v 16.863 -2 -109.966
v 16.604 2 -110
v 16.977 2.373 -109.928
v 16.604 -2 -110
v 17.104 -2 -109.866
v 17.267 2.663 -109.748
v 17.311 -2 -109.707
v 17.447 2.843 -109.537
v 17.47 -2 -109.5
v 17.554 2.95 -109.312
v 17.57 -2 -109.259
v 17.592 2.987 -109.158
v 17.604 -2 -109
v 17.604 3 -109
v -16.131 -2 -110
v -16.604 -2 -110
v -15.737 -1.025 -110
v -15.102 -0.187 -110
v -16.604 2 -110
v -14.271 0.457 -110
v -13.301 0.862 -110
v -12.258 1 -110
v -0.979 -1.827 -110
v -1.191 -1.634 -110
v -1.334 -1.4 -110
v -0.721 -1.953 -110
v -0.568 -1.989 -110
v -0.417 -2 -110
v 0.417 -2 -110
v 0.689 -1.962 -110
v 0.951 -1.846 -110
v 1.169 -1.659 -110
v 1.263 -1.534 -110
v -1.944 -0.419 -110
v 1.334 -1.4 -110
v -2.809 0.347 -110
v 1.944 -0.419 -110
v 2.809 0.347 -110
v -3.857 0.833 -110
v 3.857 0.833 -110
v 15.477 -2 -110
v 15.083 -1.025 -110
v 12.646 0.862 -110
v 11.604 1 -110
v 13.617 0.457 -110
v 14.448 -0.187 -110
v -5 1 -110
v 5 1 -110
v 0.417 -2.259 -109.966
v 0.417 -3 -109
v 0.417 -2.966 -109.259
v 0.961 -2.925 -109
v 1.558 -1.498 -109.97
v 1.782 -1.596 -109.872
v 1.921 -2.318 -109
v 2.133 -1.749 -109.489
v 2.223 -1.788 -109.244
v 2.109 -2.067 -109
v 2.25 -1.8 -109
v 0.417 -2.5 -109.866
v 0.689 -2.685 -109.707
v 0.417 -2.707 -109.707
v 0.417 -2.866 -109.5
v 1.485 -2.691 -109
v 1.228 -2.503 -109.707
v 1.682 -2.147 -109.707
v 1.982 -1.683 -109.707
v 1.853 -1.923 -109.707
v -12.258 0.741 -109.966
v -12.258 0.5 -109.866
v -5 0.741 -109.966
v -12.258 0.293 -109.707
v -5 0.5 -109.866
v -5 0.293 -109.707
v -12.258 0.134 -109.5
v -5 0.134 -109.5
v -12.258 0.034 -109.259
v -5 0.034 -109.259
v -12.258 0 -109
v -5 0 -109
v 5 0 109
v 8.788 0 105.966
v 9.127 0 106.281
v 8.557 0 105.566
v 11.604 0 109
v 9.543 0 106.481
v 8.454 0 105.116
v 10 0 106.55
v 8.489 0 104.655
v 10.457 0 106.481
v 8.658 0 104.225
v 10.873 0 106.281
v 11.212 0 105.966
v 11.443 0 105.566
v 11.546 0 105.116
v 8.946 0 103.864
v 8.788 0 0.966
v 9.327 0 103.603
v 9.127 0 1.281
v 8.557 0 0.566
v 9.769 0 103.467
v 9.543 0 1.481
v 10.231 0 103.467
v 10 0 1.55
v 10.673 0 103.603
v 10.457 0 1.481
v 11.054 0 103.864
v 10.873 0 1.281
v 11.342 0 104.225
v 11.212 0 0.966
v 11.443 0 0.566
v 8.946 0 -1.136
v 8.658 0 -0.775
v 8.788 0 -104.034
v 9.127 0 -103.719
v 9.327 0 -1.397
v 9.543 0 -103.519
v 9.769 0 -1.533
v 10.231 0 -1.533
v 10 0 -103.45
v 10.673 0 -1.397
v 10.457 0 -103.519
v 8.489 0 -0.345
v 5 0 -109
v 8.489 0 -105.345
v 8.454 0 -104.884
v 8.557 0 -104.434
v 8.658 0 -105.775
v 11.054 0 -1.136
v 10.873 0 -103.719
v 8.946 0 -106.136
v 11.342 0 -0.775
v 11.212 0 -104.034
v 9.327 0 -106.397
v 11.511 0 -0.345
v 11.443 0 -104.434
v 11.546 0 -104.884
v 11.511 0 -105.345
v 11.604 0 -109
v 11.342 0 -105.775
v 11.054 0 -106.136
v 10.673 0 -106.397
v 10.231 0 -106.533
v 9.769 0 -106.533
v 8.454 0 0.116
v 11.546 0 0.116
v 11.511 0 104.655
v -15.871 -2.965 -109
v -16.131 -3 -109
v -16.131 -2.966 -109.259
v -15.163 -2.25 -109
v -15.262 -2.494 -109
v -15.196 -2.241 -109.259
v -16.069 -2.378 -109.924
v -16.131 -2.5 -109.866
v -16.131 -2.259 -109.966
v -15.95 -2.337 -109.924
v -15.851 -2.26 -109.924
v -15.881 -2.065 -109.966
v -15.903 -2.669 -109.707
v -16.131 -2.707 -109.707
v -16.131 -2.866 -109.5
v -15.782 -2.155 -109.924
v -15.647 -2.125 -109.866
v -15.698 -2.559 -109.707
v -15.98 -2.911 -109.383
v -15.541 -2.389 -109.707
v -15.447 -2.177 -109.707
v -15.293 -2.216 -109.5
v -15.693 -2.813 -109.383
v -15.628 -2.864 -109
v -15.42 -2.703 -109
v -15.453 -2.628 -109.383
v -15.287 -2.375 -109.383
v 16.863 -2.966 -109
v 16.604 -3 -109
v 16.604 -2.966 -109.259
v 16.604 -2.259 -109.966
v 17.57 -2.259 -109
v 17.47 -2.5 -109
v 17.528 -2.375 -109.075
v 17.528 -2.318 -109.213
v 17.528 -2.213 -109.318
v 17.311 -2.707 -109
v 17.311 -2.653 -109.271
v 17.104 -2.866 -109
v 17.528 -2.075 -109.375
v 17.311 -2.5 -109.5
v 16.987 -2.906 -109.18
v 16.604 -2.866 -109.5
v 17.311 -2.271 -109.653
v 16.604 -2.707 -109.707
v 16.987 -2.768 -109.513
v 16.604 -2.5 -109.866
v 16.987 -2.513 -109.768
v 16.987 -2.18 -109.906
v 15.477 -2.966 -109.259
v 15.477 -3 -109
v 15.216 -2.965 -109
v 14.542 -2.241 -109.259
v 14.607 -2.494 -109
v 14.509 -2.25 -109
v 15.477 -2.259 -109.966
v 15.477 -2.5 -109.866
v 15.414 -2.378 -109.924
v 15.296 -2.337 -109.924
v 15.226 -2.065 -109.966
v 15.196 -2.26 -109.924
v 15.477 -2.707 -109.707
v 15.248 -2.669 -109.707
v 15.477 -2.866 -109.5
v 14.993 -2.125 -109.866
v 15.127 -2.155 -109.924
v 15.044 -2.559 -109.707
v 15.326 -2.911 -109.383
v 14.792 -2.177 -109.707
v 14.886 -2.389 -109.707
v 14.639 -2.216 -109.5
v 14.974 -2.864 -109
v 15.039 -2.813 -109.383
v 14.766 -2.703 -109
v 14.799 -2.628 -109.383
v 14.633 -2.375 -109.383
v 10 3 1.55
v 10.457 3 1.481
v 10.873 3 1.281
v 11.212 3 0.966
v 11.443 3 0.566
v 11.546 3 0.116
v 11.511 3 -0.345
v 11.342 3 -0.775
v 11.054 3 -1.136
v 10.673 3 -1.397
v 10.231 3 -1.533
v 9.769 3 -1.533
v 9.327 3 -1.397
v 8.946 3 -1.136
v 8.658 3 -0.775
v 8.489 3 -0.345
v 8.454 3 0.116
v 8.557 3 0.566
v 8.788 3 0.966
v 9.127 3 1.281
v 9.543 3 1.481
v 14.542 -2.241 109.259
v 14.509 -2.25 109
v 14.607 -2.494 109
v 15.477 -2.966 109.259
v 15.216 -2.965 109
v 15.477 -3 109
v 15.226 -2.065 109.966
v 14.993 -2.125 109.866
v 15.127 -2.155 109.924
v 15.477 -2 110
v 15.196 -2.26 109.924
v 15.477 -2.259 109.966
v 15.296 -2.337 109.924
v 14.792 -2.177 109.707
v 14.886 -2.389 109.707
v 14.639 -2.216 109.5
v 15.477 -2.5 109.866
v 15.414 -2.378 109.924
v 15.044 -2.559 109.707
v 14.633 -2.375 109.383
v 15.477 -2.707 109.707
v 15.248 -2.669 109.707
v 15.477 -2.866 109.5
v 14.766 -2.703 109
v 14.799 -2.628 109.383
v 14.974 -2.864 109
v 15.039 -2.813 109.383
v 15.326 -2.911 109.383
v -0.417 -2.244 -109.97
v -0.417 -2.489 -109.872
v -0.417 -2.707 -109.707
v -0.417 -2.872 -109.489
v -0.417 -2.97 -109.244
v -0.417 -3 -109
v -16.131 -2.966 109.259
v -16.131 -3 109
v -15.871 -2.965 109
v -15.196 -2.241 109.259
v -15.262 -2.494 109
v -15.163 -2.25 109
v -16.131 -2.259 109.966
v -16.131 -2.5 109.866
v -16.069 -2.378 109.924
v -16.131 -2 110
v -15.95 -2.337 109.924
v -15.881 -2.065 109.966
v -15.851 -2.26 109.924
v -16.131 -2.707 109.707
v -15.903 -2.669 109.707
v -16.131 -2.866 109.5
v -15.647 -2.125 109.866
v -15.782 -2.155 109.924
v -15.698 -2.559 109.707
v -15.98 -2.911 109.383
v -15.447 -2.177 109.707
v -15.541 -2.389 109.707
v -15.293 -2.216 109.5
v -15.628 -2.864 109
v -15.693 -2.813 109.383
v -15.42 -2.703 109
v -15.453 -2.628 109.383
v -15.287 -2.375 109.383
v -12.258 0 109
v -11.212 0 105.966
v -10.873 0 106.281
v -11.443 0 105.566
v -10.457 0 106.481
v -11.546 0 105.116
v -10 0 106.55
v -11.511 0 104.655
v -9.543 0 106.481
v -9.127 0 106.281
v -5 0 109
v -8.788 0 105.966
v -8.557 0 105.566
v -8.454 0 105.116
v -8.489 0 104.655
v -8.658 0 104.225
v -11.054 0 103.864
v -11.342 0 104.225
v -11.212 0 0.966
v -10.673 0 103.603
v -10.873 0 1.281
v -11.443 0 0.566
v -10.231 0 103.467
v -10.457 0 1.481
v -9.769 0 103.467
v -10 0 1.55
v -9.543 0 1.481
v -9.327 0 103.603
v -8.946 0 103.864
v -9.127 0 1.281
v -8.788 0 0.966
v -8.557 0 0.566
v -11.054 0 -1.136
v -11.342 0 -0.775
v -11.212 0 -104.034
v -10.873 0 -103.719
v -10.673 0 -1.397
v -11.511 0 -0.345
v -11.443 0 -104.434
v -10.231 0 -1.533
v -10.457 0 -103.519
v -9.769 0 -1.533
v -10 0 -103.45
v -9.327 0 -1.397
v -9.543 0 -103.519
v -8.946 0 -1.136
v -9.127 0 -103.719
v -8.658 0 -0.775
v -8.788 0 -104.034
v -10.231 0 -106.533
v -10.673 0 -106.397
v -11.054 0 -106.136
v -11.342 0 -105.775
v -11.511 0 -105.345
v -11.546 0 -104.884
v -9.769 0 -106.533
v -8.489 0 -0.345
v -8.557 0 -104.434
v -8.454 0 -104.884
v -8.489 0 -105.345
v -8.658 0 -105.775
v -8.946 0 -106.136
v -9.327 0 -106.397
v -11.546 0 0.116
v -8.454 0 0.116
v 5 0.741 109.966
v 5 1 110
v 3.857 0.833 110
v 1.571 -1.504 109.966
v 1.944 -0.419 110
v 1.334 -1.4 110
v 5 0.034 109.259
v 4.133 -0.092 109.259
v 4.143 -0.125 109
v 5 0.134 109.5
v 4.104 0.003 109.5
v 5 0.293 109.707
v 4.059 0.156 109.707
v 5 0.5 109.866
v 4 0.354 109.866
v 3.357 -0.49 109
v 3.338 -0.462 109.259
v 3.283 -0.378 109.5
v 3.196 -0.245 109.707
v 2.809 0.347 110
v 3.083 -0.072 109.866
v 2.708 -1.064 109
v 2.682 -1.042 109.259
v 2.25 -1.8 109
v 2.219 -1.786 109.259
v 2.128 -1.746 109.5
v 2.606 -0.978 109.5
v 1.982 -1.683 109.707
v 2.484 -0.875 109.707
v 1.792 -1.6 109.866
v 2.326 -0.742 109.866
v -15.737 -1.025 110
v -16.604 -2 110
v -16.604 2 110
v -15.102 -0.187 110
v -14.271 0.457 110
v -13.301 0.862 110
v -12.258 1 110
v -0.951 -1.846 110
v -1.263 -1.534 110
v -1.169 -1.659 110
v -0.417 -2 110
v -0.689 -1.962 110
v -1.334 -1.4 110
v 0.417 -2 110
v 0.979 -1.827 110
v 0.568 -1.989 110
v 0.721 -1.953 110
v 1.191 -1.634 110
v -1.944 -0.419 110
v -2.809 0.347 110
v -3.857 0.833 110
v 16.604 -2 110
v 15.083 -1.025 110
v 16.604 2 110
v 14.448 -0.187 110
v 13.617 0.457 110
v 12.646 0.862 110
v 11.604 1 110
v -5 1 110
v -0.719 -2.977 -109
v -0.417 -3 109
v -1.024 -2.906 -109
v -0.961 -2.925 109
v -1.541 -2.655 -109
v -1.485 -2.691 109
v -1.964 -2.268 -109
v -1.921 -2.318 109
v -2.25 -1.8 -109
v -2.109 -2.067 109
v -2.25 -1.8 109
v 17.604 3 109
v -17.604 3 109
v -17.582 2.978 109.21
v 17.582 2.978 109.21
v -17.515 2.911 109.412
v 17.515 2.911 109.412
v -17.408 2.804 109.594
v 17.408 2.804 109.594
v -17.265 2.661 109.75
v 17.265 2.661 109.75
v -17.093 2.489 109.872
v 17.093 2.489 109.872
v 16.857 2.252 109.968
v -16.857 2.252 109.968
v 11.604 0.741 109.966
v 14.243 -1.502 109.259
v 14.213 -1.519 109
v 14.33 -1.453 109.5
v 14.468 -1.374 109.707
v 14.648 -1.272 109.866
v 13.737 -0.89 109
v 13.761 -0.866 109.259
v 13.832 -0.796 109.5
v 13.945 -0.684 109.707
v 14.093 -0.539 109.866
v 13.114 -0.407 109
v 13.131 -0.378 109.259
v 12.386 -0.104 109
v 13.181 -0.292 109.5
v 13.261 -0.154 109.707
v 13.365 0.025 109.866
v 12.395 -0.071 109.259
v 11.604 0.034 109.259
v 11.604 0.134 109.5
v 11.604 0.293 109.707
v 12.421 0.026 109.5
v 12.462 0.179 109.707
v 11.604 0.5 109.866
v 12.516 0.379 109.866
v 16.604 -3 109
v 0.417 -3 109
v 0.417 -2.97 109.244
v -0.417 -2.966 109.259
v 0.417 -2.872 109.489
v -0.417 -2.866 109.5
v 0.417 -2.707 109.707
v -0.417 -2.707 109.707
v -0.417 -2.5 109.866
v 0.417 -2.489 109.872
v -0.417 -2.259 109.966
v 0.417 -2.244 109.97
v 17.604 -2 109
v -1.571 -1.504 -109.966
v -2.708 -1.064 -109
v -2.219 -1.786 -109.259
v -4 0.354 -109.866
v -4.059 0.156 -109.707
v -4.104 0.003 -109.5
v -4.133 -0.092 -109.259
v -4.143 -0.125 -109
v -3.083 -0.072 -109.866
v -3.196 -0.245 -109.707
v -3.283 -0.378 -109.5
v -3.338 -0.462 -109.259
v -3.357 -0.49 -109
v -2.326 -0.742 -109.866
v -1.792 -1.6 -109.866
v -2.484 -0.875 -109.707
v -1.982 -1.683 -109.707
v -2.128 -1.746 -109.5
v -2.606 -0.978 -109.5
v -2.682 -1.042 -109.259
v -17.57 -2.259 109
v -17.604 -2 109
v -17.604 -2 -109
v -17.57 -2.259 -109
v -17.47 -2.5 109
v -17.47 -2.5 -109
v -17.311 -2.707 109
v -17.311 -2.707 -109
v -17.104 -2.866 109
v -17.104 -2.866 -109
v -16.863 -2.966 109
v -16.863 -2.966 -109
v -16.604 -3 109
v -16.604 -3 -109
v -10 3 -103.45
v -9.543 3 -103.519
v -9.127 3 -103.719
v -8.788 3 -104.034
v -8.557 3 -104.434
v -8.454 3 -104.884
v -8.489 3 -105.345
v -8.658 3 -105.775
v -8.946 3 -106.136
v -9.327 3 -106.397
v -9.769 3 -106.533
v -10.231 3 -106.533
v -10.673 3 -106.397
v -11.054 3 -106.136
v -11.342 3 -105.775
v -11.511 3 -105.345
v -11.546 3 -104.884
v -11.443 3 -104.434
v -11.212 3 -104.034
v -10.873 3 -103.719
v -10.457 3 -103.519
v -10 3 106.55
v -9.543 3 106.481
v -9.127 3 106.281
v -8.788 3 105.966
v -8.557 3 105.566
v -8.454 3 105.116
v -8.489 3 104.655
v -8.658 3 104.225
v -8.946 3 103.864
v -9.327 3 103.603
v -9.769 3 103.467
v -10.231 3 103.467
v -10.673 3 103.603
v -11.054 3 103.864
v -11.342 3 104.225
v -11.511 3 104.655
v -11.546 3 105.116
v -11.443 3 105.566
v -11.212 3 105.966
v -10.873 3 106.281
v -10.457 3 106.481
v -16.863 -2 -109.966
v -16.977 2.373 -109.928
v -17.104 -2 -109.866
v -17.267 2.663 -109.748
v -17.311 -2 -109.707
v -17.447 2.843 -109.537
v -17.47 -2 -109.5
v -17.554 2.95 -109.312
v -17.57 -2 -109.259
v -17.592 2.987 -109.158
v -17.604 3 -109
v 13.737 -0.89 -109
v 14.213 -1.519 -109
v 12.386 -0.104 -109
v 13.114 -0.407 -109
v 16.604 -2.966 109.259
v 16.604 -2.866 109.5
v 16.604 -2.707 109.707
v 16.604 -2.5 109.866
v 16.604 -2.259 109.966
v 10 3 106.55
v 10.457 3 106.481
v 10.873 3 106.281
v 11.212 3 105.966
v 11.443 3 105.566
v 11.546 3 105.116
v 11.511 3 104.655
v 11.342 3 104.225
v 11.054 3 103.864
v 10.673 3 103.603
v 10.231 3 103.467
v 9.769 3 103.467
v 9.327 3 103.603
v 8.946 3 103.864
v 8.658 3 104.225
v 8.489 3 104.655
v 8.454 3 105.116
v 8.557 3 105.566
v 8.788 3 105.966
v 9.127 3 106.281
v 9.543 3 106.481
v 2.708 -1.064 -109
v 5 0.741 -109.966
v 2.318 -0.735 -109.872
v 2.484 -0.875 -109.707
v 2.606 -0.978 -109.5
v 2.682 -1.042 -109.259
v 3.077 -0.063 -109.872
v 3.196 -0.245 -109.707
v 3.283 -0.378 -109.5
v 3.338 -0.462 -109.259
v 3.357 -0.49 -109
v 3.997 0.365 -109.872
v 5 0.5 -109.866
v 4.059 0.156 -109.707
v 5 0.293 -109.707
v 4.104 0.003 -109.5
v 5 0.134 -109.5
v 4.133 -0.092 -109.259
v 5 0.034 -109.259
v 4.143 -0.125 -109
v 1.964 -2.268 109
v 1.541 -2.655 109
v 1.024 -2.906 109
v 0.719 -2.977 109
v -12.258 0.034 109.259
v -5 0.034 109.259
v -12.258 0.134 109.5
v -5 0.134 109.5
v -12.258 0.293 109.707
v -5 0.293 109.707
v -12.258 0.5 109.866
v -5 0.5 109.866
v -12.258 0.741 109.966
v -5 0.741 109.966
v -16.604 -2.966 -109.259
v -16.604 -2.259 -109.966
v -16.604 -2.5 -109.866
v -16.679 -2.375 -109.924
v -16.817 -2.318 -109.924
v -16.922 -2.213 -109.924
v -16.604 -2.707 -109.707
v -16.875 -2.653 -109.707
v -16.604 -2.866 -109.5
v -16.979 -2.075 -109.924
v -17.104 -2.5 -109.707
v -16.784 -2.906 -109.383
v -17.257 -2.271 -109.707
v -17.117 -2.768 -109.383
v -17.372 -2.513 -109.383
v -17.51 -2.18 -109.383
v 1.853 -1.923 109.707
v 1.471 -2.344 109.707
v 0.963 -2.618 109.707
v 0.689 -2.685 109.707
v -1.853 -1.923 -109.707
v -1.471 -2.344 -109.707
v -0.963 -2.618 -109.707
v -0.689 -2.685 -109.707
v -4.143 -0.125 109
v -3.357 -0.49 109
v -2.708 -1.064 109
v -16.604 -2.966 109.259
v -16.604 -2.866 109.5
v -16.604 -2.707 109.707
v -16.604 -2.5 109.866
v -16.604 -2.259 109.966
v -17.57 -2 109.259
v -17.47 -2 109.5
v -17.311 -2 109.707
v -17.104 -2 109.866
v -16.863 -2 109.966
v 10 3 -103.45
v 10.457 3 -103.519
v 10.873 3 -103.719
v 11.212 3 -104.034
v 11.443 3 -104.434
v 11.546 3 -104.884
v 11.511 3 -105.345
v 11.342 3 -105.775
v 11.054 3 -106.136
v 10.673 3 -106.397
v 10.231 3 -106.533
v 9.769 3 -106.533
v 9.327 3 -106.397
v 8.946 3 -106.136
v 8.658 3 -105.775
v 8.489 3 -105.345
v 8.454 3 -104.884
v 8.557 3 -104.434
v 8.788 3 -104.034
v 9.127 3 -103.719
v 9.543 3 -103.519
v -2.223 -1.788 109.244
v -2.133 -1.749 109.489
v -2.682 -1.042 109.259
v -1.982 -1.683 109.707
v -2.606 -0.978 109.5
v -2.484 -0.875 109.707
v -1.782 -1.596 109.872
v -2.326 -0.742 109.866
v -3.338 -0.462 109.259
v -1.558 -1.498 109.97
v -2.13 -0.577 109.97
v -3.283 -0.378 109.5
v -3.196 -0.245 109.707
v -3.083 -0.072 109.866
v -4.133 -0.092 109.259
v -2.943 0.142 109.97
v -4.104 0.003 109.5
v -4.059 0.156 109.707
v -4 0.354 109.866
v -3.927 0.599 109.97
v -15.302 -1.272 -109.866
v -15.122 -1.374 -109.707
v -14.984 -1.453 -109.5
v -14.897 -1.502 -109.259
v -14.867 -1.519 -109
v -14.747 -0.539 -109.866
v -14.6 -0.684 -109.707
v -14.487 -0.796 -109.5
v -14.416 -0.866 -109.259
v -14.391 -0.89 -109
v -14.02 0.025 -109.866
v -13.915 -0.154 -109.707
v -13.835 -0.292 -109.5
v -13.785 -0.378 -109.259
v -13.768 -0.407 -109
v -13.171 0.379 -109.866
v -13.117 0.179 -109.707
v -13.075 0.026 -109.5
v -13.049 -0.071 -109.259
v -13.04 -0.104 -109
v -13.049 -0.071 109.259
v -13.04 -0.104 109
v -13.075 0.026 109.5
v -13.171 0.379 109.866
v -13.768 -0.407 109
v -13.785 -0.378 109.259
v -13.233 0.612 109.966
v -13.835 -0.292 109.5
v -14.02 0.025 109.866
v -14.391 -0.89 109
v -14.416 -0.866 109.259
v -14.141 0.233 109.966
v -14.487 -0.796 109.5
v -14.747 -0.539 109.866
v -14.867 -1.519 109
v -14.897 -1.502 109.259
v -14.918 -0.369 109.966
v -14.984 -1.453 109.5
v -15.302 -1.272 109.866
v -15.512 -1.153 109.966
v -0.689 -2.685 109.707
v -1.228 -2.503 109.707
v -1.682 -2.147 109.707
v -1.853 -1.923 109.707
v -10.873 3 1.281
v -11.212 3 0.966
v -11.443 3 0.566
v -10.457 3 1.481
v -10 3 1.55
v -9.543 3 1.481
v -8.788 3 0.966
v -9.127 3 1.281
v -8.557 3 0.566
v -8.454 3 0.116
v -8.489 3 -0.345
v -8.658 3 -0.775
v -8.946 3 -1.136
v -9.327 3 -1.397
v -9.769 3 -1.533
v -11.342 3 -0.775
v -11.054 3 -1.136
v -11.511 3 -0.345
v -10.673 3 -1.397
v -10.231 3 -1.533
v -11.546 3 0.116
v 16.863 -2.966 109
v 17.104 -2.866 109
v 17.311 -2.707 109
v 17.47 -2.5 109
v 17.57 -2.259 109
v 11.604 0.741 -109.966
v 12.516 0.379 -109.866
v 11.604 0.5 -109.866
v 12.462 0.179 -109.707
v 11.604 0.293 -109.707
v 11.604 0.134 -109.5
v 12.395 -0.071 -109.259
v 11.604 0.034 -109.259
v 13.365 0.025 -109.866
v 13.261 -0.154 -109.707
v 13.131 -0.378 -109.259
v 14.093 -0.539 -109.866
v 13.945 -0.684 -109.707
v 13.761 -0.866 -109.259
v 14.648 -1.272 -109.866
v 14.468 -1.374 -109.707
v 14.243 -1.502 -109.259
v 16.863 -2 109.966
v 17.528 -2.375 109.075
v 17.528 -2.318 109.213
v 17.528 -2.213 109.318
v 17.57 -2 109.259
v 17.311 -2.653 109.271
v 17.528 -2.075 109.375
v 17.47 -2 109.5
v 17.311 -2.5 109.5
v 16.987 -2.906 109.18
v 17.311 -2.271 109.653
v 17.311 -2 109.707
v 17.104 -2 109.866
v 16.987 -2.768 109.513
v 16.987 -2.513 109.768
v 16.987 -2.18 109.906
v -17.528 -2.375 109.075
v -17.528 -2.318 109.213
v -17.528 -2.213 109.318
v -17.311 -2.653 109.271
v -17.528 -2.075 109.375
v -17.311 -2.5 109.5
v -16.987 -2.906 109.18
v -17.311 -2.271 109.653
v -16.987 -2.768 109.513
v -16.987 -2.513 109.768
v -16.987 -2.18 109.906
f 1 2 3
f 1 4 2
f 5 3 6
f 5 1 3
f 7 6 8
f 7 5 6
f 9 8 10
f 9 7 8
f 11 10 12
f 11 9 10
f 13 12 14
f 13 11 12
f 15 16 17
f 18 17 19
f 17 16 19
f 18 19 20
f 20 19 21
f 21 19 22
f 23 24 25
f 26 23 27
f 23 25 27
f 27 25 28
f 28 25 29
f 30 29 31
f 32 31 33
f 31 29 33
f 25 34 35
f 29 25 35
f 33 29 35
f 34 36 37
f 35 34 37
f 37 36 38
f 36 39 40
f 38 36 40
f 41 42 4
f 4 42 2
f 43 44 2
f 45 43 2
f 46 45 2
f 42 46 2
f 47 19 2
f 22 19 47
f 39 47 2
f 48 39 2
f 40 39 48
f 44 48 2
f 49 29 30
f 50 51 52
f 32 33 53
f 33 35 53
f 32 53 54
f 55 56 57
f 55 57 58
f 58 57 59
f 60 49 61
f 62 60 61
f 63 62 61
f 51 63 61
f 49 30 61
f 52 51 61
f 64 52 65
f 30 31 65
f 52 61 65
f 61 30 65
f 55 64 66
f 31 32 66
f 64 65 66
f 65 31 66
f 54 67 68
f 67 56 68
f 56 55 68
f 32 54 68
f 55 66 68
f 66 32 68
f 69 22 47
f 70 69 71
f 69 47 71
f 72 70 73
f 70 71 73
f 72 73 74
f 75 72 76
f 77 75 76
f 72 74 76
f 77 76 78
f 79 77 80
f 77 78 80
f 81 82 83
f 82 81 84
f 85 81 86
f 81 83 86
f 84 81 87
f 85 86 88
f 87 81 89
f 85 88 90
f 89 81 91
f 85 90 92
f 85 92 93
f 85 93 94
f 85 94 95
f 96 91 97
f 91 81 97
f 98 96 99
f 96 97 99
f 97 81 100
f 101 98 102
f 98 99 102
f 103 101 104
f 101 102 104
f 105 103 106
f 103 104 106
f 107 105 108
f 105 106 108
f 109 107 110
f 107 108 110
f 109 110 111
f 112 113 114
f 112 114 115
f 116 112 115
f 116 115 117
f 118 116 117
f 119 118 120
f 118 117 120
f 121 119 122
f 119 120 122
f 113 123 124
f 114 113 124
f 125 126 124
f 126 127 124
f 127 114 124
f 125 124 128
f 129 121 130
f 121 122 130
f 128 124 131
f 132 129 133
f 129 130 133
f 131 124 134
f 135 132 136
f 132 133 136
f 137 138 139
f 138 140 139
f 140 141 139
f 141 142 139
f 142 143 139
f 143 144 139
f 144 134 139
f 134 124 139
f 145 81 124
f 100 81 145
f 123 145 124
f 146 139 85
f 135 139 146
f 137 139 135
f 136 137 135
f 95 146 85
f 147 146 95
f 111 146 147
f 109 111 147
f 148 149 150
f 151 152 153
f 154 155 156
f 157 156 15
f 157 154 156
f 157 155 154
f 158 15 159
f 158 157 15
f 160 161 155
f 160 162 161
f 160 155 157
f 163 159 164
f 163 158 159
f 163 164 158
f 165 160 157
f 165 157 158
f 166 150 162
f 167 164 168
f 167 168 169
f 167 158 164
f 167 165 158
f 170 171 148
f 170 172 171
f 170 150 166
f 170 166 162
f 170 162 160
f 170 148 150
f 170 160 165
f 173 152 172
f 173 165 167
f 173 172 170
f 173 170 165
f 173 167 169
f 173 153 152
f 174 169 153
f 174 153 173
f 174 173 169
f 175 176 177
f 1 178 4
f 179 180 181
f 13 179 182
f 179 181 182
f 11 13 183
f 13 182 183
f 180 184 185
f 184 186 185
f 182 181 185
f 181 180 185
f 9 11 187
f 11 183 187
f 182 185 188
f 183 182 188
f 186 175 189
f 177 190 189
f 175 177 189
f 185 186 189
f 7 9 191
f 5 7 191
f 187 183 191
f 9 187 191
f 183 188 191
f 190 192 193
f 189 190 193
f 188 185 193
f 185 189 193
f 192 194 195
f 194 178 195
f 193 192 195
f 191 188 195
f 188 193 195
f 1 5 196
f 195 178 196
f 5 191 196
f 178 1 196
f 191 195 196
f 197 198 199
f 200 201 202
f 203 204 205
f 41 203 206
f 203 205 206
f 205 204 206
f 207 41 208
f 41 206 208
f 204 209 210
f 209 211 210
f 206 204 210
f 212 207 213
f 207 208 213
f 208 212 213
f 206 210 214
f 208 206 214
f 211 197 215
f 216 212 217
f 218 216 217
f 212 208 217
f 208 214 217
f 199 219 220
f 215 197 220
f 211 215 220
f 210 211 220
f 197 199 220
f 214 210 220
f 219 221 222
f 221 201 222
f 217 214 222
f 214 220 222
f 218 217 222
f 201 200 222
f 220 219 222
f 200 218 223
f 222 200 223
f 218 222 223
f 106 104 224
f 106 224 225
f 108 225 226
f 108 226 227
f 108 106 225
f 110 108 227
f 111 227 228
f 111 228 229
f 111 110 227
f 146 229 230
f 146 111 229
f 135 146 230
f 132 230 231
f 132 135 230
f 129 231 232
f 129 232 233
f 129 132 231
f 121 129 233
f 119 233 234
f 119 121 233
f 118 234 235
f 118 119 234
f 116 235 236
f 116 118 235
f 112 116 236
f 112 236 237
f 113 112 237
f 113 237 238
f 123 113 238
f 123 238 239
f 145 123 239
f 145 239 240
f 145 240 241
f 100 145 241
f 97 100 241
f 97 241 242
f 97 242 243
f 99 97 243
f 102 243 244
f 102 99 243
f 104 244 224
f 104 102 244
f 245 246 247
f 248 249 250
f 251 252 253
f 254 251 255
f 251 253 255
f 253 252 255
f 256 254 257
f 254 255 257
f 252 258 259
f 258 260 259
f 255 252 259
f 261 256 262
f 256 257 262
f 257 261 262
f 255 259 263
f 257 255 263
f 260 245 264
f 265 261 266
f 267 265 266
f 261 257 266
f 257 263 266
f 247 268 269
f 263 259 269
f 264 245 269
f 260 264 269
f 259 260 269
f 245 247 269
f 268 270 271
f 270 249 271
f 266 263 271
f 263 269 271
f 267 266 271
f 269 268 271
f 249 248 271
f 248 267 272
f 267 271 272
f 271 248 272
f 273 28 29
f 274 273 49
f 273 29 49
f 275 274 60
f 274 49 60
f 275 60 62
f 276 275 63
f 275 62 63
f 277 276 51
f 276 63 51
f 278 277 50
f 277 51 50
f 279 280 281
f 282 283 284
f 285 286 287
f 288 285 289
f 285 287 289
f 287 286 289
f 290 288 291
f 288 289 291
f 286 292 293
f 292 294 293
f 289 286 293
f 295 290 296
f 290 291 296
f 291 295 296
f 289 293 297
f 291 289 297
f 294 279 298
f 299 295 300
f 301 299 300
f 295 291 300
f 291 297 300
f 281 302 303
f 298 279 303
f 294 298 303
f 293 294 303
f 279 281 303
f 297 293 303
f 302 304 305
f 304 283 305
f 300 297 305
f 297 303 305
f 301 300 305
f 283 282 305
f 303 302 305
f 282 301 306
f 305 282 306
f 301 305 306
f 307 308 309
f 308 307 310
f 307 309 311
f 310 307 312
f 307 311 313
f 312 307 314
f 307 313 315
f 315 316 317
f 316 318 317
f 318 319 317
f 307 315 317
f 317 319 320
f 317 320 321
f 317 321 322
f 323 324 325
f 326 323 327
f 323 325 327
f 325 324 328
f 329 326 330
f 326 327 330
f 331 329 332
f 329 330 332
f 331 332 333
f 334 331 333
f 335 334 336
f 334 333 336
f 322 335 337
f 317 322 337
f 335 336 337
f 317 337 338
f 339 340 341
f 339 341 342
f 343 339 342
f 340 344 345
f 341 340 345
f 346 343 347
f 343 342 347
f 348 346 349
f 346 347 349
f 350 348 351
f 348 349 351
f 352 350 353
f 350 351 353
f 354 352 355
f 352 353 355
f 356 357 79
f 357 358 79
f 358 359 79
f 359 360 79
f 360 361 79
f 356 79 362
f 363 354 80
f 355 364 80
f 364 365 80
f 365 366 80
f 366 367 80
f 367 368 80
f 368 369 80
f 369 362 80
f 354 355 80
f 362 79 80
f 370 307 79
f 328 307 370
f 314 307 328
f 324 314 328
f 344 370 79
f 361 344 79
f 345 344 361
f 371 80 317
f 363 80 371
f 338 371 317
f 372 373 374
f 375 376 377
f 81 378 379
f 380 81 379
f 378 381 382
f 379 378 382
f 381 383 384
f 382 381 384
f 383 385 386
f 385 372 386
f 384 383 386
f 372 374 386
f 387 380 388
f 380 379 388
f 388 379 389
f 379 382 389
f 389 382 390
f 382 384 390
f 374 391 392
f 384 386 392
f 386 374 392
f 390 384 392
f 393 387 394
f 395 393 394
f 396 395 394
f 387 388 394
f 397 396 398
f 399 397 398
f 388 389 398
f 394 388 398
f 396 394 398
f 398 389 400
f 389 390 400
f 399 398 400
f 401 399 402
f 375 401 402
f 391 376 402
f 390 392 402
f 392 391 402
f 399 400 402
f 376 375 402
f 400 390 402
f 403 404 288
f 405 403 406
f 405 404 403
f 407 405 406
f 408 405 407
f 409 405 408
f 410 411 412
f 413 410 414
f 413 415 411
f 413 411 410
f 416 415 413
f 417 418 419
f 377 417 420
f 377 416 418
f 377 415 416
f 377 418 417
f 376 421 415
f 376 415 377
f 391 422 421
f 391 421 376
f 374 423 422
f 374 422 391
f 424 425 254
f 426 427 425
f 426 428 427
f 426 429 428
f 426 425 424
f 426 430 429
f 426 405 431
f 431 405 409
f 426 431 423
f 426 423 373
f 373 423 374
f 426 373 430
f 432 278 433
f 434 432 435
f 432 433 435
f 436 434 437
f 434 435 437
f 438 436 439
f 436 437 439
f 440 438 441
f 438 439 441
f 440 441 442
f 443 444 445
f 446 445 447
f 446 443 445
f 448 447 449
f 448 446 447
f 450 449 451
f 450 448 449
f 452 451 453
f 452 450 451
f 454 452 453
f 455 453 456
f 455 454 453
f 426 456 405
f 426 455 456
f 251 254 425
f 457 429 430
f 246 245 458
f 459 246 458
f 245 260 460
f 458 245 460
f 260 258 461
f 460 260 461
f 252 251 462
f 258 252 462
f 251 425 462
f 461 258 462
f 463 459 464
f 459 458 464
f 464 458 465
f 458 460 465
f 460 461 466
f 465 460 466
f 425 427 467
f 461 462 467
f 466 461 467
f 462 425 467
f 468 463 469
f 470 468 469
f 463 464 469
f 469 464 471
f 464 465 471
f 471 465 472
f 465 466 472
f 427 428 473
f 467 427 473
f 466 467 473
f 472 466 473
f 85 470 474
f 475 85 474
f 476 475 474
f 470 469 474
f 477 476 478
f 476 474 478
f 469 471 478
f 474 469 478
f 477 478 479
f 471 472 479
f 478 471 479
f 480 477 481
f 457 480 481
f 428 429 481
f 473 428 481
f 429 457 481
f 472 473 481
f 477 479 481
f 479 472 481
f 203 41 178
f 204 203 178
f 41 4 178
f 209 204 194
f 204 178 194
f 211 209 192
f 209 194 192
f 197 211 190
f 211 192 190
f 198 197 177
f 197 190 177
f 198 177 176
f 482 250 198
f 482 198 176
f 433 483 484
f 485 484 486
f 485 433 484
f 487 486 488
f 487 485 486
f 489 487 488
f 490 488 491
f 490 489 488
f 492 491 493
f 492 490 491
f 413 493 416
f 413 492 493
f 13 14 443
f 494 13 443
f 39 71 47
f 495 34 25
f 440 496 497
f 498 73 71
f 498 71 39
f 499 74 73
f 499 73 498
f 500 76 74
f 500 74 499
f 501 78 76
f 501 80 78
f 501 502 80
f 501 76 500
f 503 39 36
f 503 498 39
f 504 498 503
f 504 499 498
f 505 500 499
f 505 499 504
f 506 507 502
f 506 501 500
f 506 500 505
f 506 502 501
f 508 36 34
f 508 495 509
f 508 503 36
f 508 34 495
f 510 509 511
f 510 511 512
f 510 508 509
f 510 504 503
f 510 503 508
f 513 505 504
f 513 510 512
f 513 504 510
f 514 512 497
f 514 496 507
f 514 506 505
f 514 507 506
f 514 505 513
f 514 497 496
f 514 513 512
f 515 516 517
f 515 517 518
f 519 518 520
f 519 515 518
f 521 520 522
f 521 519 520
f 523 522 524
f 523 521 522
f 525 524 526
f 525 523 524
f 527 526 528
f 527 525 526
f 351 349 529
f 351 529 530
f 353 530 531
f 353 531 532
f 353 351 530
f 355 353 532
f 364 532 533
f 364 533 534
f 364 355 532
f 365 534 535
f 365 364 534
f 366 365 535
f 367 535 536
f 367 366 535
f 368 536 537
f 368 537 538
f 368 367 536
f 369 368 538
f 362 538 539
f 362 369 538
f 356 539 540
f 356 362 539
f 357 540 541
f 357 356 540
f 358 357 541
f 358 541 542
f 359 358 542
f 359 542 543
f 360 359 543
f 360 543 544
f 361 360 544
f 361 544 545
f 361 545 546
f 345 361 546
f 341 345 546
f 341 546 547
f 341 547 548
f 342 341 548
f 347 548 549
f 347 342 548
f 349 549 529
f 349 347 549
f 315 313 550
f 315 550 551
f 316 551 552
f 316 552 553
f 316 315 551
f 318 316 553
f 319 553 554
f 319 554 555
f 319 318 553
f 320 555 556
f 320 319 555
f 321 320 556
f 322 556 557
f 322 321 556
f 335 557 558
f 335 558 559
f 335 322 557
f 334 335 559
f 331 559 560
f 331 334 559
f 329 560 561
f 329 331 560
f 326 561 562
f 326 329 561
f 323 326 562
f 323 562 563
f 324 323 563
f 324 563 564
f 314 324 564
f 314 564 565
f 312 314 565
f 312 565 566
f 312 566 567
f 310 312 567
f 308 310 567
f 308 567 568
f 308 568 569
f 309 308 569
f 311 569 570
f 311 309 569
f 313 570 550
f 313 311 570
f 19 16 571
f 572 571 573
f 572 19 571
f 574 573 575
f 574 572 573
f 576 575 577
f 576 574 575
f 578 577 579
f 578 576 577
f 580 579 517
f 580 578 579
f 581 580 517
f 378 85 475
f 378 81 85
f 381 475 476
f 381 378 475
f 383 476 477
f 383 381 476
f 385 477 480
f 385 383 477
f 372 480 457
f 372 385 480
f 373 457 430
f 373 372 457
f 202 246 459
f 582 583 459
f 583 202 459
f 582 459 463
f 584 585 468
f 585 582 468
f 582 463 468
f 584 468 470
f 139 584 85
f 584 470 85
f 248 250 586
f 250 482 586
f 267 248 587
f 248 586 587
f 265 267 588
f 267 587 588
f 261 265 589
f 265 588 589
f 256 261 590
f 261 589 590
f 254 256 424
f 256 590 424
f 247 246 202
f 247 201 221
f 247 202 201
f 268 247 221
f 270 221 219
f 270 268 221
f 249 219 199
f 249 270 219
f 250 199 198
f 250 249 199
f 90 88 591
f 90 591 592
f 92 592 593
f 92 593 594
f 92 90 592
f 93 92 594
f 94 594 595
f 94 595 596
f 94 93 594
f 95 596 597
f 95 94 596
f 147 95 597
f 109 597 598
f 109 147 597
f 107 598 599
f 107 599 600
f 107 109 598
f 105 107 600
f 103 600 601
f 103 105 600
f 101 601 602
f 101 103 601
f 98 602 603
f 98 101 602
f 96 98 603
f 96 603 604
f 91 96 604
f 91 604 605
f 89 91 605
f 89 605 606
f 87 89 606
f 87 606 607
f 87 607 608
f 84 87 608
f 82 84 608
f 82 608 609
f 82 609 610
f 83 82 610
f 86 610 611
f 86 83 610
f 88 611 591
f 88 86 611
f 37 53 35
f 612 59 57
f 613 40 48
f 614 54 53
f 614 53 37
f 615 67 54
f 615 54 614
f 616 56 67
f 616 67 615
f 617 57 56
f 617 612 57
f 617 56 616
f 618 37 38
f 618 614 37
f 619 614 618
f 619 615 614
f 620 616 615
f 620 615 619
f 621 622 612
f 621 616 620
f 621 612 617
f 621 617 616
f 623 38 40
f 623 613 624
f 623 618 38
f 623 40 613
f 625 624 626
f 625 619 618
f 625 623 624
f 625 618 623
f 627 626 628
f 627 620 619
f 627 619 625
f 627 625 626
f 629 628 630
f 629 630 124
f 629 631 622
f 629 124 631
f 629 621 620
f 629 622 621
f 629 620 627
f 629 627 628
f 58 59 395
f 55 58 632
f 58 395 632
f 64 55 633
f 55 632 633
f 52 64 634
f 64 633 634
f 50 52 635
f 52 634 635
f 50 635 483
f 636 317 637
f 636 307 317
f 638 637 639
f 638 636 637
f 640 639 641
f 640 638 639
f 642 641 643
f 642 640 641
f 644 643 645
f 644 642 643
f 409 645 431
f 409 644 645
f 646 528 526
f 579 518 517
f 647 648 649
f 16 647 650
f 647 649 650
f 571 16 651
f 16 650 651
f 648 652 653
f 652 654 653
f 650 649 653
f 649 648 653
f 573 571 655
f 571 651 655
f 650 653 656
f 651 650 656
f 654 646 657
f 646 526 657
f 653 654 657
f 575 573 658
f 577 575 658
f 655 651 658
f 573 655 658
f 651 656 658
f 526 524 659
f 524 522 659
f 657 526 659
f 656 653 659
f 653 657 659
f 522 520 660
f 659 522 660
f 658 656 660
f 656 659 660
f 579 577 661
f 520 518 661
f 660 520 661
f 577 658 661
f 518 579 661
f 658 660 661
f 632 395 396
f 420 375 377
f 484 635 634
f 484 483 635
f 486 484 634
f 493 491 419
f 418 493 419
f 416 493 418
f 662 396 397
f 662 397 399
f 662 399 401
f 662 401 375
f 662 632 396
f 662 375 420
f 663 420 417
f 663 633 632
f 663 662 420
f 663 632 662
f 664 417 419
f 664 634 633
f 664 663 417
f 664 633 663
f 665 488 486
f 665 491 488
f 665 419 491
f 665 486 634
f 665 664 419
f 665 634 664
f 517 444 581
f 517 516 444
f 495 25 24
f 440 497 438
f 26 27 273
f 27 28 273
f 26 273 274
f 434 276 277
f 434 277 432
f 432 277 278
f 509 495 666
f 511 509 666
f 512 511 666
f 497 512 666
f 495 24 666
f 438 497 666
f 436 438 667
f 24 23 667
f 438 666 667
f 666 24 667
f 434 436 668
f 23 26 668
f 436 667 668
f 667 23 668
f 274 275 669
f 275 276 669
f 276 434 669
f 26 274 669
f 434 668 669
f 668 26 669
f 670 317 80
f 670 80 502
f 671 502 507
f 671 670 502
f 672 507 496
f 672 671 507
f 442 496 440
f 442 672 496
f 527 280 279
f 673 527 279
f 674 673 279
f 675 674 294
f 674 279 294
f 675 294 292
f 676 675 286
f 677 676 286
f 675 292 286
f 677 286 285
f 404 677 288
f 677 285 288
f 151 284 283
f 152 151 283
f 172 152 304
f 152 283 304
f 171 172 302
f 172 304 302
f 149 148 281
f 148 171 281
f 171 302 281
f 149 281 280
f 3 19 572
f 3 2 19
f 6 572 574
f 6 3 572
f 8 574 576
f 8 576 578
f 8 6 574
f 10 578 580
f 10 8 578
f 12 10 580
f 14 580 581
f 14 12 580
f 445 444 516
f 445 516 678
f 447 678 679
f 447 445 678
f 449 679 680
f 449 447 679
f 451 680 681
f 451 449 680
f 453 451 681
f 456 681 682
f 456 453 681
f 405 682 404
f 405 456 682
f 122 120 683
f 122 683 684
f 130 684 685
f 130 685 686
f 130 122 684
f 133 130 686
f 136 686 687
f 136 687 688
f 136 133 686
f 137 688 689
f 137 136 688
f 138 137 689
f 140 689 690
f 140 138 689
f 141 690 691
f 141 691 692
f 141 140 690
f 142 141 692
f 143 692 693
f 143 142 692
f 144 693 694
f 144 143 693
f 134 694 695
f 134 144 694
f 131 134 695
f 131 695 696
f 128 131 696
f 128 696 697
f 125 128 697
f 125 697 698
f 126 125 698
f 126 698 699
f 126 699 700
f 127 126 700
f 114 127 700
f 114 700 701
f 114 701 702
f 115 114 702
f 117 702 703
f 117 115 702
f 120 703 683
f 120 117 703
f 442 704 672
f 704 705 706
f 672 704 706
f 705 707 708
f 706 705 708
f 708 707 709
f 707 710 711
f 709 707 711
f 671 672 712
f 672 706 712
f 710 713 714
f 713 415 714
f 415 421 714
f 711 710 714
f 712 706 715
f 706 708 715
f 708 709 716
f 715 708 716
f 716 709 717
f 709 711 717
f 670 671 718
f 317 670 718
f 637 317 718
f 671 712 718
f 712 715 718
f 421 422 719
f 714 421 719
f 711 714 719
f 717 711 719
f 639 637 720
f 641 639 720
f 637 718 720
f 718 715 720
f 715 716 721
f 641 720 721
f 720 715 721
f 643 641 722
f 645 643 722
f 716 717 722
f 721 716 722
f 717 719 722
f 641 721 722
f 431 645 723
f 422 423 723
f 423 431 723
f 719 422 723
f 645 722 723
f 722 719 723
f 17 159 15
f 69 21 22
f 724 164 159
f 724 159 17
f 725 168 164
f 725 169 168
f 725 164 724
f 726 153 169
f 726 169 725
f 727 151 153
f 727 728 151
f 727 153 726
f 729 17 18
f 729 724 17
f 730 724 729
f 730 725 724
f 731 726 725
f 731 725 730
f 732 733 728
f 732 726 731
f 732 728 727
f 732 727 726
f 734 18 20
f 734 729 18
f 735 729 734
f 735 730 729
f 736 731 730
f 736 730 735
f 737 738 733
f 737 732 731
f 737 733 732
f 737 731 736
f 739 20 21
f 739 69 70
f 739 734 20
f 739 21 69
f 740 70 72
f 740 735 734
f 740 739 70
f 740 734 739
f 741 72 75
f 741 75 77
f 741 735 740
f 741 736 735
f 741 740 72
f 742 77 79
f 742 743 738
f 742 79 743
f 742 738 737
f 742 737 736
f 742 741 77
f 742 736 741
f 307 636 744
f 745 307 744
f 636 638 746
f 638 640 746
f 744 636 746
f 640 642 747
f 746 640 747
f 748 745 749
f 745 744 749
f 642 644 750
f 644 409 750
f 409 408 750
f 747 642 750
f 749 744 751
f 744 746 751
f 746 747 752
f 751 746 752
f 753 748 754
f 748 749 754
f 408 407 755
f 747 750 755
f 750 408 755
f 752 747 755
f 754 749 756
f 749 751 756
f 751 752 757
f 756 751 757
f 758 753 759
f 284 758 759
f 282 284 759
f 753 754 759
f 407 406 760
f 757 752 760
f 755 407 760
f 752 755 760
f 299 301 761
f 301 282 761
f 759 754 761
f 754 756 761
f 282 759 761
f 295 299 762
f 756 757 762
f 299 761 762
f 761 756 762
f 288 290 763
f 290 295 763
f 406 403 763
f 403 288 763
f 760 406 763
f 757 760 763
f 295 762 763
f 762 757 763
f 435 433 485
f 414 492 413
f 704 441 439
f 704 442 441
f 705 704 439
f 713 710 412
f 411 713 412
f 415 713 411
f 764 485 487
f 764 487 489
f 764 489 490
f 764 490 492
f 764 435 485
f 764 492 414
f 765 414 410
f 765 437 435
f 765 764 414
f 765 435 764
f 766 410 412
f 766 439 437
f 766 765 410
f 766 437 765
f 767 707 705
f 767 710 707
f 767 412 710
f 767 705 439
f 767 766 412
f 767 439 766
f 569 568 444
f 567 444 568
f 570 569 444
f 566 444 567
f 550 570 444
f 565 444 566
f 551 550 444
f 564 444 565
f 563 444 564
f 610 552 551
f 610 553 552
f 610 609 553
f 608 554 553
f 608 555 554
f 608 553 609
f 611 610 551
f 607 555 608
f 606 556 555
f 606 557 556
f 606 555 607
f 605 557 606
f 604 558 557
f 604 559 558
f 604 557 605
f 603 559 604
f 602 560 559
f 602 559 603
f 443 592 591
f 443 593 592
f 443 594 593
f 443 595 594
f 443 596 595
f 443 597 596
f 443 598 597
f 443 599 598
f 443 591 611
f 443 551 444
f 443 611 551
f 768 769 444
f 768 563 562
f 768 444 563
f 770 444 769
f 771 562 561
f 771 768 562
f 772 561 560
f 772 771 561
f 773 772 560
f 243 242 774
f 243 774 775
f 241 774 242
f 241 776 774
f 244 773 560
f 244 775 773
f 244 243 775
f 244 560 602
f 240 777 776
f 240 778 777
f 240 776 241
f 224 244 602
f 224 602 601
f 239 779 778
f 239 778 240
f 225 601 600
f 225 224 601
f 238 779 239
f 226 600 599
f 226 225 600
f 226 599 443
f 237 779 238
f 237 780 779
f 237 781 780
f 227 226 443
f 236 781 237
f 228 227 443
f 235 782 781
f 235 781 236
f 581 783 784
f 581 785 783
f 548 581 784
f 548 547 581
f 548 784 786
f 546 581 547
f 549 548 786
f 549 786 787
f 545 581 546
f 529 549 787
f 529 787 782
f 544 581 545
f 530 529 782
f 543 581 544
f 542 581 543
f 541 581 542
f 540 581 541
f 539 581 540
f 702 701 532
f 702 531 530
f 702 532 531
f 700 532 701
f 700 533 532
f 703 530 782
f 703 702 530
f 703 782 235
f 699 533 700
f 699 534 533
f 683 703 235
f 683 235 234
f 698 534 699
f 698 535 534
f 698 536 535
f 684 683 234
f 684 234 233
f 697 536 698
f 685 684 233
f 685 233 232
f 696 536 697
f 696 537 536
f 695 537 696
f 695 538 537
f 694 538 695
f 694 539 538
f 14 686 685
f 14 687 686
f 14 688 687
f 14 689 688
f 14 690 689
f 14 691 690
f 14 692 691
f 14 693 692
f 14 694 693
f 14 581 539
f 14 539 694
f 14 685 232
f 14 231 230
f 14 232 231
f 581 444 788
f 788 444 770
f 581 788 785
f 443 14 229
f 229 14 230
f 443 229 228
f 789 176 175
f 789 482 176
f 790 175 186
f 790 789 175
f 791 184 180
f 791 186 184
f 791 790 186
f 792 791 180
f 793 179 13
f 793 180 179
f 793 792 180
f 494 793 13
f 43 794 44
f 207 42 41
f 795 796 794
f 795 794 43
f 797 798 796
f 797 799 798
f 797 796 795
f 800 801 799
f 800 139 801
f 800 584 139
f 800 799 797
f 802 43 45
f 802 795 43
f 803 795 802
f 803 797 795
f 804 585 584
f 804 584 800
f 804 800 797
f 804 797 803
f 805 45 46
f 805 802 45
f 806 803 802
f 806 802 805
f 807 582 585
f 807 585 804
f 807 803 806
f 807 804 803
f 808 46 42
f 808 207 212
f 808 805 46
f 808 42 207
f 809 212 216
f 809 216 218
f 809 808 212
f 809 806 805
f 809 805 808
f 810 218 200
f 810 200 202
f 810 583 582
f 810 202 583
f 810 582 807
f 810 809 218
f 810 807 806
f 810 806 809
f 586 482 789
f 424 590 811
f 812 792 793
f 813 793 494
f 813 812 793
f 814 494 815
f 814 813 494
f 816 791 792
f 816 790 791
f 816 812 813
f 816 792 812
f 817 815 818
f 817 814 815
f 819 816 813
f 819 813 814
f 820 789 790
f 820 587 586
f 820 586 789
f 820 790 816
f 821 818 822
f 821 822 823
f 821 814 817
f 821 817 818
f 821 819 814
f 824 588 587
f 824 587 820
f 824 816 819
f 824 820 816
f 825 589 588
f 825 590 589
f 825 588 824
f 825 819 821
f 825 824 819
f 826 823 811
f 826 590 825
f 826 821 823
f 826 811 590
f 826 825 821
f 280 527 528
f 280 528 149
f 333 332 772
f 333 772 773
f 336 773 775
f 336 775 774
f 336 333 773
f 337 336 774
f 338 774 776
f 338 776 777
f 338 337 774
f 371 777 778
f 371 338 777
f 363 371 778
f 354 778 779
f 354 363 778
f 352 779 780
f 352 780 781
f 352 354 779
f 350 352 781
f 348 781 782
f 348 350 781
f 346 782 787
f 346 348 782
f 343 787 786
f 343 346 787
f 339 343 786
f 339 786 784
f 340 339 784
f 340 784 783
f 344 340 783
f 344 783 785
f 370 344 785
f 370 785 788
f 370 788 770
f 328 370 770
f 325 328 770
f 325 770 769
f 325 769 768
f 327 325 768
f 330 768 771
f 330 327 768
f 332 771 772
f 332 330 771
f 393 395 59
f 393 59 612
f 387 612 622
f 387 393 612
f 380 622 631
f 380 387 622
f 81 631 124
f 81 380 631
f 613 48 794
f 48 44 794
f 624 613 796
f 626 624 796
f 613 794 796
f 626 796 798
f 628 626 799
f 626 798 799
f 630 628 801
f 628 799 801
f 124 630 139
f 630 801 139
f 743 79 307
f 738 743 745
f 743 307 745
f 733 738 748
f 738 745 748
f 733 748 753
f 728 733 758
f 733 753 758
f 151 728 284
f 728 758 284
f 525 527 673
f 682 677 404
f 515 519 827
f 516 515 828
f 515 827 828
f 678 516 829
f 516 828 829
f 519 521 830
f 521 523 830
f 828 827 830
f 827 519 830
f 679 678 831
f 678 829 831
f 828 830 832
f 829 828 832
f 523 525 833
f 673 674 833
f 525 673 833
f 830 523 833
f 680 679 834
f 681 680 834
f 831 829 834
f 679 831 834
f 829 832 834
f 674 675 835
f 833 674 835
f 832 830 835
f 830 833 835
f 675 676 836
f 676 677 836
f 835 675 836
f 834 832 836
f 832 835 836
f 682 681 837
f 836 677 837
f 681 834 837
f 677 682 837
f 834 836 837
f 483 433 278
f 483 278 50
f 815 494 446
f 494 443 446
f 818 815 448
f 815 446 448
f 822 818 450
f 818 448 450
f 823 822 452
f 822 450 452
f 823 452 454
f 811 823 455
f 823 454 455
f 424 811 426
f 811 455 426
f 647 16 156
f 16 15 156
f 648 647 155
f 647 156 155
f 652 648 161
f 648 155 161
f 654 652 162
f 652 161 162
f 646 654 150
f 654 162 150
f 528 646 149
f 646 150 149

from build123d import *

# Parameters (mm, degrees)
SKETCH_1_W      = 35.208152802
SKETCH_1_H      = 220
SKETCH_1_R      = 1.55
EXTRUDE_1_DEPTH = 3
SKETCH_2_W      = 3
SKETCH_2_H      = 220
SKETCH_2_W_2    = 2
SKETCH_2_W_3    = 2.345683745
EXTRUDE_2_DEPTH = 3
FILLET_1_R      = 3
FILLET_2_R      = 2
FILLET_3_R      = 1


with BuildPart() as part:
    # 草图1 → 凸台-拉伸1 (new body)
    with BuildSketch(Plane(origin=(0, 0, 0), x_dir=(1, 0, 0), z_dir=(0, 1, 0))):
        Rectangle(SKETCH_1_W, SKETCH_1_H)
        with Locations(Location((10, -105, 0), (0, 0, 270))):
            Circle(SKETCH_1_R, mode=Mode.SUBTRACT)
        with Locations(Location((-10, -105, 0), (0, 0, 270))):
            Circle(SKETCH_1_R, mode=Mode.SUBTRACT)
        with Locations(Location((10, 0, 0), (0, 0, 270))):
            Circle(SKETCH_1_R, mode=Mode.SUBTRACT)
        with Locations(Location((-10, 0, 0), (0, 0, 270))):
            Circle(SKETCH_1_R, mode=Mode.SUBTRACT)
        with Locations(Location((10, 105, 0), (0, 0, 270))):
            Circle(SKETCH_1_R, mode=Mode.SUBTRACT)
        with Locations(Location((-10, 105, 0), (0, 0, 270))):
            Circle(SKETCH_1_R, mode=Mode.SUBTRACT)
    extrude(amount=EXTRUDE_1_DEPTH)

    # 草图2 → 凸台-拉伸2 (add)
    with BuildSketch(Plane.XZ):
        with Locations((16.104076401, 0)):
            Rectangle(SKETCH_2_W, SKETCH_2_H)
        with Locations((-1, 0)):
            Rectangle(SKETCH_2_W_2, SKETCH_2_H)
        with Locations((1, 0)):
            Rectangle(SKETCH_2_W_2, SKETCH_2_H)
        with Locations((-16.431234528, 0)):
            Rectangle(SKETCH_2_W_3, SKETCH_2_H)
    extrude(amount=EXTRUDE_2_DEPTH)

    # 圆角1
    fillet_1_edges = [part.edges().sort_by_distance(p)[0] for p in [
        (14.604076401, 0, 0),
        (2, 0, 0),
        (-2, 0, 0),
        (-15.258392656, 0, 0),
    ]]
    fillet(fillet_1_edges, radius=FILLET_1_R - 0.0001)  # a hair under: the kernel refuses the full size

    # 圆角2
    fillet_2_edges = [part.edges().sort_by_distance(p)[0] for p in [
        (-2, -3, 0),
        (2, -3, 0),
    ]]
    fillet(fillet_2_edges, radius=FILLET_2_R)

    # 圆角3
    fillet_3_edges = [part.edges().sort_by_distance(p)[0] for p in [
        (-3.356770668, -0.490014343, -110),
        (0, -3, 110),
        (3.356770668, -0.490014343, 110),
        (1.512845841, -2.673312882, 110),
        (-1.512845841, -2.673312882, 110),
        (0, -3, -110),
        (1.512845841, -2.673312882, -110),
        (-1.512845841, -2.673312882, -110),
        (0, 3, -110),
        (16.104076401, -3, 110),
        (14.604076401, -3, 0),
        (16.104076401, -3, -110),
        (17.604076401, -3, 0),
        (-15.258392656, -3, 0),
        (-16.431234528, -3, 110),
        (-17.604076401, -3, 0),
        (-16.431234528, -3, -110),
        (-17.604076401, 0, -110),
        (17.604076401, 0, -110),
        (17.604076401, 0, 110),
        (-17.604076401, 0, 110),
        (8.3020382, 0, -110),
        (8.3020382, 0, 110),
        (-8.629196328, 0, 110),
        (-8.629196328, 0, -110),
        (13.725426034, -0.878650367, -110),
        (13.725426034, -0.878650367, 110),
        (0, 3, 110),
        (3.356770668, -0.490014343, -110),
        (-3.356770668, -0.490014343, 110),
        (-14.379742289, -0.878650367, -110),
        (-14.379742289, -0.878650367, 110),
    ]]
    fillet(fillet_3_edges, radius=FILLET_3_R)


solid = part.part
